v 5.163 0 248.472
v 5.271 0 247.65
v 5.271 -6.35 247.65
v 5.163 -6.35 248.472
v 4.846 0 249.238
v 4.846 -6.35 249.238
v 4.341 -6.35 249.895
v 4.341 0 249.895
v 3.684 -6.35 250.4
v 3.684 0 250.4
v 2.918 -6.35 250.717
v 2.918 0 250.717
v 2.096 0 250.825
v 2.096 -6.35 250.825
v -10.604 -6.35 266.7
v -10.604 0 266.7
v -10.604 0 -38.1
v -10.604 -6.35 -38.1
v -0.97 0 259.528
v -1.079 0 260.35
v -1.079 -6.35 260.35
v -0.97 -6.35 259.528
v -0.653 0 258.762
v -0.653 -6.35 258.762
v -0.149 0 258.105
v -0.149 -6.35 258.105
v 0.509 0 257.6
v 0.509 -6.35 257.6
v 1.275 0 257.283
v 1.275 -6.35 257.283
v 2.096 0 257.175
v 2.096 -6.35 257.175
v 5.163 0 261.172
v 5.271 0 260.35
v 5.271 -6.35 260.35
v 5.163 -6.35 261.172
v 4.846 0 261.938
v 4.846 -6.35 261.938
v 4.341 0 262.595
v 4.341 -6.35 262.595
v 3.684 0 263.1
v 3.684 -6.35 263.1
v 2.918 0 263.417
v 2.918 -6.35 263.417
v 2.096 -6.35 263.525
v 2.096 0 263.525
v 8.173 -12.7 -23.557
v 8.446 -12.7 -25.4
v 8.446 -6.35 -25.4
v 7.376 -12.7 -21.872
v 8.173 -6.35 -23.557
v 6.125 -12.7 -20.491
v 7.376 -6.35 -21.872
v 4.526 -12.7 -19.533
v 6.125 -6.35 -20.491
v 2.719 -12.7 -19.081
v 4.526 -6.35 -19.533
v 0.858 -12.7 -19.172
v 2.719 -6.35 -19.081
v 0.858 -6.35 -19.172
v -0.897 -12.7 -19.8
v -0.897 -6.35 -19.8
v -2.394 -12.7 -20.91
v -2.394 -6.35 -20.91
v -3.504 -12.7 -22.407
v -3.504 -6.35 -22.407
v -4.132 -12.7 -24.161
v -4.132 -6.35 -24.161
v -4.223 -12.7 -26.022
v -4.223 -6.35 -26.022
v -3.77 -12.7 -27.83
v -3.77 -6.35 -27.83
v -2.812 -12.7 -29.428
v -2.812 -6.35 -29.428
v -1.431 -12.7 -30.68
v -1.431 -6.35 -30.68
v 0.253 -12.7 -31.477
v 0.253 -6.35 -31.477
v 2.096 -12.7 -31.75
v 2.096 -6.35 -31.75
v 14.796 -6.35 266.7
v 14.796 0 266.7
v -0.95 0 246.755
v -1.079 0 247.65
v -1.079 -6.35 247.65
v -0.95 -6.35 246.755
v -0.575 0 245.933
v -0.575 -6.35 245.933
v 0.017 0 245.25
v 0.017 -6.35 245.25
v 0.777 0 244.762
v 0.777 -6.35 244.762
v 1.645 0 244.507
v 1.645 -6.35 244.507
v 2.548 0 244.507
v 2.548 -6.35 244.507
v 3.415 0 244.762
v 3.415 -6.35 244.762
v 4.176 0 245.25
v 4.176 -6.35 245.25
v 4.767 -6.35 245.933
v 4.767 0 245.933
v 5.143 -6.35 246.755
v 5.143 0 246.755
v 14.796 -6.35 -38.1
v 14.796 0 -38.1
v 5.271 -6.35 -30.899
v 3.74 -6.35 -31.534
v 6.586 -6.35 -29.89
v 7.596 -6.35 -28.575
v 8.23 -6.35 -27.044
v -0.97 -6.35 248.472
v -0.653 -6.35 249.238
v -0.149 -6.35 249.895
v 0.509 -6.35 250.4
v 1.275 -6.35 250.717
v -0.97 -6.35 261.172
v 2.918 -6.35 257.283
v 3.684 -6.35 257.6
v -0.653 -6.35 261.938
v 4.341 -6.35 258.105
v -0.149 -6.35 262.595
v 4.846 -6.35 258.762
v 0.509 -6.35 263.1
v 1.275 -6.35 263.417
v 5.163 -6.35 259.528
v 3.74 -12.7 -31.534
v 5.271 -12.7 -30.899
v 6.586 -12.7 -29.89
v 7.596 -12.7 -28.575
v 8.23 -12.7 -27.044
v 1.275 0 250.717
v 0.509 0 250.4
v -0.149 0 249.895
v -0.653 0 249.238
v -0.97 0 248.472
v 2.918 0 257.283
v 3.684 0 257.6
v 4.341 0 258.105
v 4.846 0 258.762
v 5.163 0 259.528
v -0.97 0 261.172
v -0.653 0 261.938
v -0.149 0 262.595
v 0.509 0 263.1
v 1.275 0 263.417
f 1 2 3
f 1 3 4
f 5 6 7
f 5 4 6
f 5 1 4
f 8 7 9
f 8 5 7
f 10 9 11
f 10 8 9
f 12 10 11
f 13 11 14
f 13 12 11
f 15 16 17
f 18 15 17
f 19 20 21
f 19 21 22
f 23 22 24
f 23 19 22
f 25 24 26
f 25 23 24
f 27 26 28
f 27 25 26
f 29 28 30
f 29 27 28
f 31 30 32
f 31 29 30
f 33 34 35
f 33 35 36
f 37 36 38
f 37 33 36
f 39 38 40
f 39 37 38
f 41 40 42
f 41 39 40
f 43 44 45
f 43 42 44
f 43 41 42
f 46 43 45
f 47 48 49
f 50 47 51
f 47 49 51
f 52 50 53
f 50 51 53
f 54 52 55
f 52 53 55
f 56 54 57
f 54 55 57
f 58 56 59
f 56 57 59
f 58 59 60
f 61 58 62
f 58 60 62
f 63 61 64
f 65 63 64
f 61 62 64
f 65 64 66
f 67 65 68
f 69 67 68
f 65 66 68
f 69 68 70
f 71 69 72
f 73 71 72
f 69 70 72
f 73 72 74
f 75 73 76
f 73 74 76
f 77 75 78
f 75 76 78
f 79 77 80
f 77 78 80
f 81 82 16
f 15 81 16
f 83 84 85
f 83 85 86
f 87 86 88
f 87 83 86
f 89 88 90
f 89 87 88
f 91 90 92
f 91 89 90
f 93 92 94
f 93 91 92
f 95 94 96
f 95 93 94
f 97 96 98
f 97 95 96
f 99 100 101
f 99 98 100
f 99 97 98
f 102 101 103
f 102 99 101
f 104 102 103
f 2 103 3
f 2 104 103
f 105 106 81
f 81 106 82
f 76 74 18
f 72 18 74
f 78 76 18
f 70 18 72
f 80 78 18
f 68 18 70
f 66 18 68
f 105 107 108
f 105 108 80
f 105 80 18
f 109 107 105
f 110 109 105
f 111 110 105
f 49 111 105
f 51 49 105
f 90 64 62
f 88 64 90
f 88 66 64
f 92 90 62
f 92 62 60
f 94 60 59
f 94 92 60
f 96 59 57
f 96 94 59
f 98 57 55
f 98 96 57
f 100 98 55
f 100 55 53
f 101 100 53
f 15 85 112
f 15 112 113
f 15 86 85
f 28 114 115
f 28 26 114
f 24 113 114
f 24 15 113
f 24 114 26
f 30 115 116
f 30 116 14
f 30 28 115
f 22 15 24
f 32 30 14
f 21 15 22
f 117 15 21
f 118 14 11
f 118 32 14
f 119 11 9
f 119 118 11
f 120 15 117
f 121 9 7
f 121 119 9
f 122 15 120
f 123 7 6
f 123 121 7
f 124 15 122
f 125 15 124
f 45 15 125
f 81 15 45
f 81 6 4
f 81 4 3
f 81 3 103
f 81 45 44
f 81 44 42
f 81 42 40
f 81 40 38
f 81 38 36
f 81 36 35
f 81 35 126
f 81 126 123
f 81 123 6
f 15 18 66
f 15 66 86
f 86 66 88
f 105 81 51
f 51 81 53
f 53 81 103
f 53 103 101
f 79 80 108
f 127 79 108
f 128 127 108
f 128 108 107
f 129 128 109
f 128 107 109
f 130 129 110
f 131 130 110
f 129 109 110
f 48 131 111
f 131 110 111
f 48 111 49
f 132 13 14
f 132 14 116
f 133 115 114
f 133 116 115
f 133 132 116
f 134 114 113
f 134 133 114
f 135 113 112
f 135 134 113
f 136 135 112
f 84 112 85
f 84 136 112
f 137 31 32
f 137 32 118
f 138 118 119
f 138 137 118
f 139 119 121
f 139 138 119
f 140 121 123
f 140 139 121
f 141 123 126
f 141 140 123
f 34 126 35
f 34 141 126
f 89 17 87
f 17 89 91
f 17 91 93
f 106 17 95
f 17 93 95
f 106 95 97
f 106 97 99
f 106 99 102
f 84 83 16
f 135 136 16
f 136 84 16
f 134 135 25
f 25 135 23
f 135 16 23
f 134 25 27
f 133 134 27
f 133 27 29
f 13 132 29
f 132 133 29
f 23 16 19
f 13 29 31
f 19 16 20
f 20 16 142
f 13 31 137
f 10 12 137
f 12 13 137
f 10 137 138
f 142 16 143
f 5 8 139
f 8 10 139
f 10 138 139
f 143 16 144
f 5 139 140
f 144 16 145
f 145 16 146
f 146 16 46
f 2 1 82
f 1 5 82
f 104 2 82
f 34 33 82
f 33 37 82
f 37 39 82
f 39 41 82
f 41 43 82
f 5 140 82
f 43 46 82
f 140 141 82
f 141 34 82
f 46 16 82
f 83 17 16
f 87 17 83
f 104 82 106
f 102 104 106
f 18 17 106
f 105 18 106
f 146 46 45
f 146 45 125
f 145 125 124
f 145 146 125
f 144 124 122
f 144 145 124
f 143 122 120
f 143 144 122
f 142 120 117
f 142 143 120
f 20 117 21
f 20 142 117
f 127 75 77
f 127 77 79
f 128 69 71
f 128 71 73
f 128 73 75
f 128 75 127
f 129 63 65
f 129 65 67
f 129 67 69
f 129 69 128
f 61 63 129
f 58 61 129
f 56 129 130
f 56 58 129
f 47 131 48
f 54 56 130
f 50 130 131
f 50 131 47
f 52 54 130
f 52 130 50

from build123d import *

# Parameters (mm, degrees)
F1_DEPTH = 6.35
F2_DEPTH = 12.7
F3_DEPTH = 24.638


with BuildPart() as f1:
    # F0 (on Front) → F1 (new body)
    with BuildSketch(Plane.XZ):
        with BuildLine():
            Line((-1.0786289811, 247.65), (-10.6036289811, 247.65))
            Line((-10.6036289811, 247.65), (-10.6036289811, -38.1))
            Line((-10.6036289811, -38.1), (2.0963710189, -38.1))
            Line((2.0963710189, -38.1), (14.7963710189, -38.1))
            Line((14.7963710189, -38.1), (14.7963710189, 247.65))
            Line((14.7963710189, 247.65), (5.2713710189, 247.65))
            ThreePointArc((5.2713710189, 247.65), (2.0963710189, 244.475), (-1.0786289811, 247.65))
        make_face()
        with BuildLine():
            ThreePointArc((8.4463710189, -25.4), (6.5864990794, -29.8901280605), (2.0963710189, -31.75))
            ThreePointArc((2.0963710189, -31.75), (-2.3937570416, -20.9098719395), (8.4463710189, -25.4))
        make_face(mode=Mode.SUBTRACT)
        with BuildLine():
            Line((-1.0786289811, 260.35), (-10.6036289811, 260.35))
            Line((-10.6036289811, 260.35), (-10.6036289811, 247.65))
            Line((-10.6036289811, 247.65), (-1.0786289811, 247.65))
            ThreePointArc((-1.0786289811, 247.65), (-0.1486930114, 249.8950640303), (2.0963710189, 250.825))
            Line((2.0963710189, 250.825), (2.0963710189, 257.175))
            ThreePointArc((2.0963710189, 257.175), (-0.1486930114, 258.1049359697), (-1.0786289811, 260.35))
        make_face()
        with BuildLine():
            Line((14.7963710189, 247.65), (14.7963710189, 260.35))
            Line((14.7963710189, 260.35), (5.2713710189, 260.35))
            ThreePointArc((5.2713710189, 260.35), (4.3414350492, 258.1049359697), (2.0963710189, 257.175))
            Line((2.0963710189, 257.175), (2.0963710189, 250.825))
            ThreePointArc((2.0963710189, 250.825), (4.3414350492, 249.8950640303), (5.2713710189, 247.65))
            Line((5.2713710189, 247.65), (14.7963710189, 247.65))
        make_face()
        with BuildLine():
            ThreePointArc((8.4463710189, -25.4), (-2.3937570416, -20.9098719395), (2.0963710189, -31.75))
            ThreePointArc((2.0963710189, -31.75), (6.5864990794, -29.8901280605), (8.4463710189, -25.4))
        make_face()
        with BuildLine():
            Line((2.0963710189, 266.7), (-10.6036289811, 266.7))
            Line((-10.6036289811, 266.7), (-10.6036289811, 260.35))
            Line((-10.6036289811, 260.35), (-1.0786289811, 260.35))
            ThreePointArc((-1.0786289811, 260.35), (-0.1486930114, 262.5950640303), (2.0963710189, 263.525))
            Line((2.0963710189, 263.525), (2.0963710189, 266.7))
        make_face()
        with BuildLine():
            Line((14.7963710189, 266.7), (2.0963710189, 266.7))
            Line((2.0963710189, 266.7), (2.0963710189, 263.525))
            ThreePointArc((2.0963710189, 263.525), (4.3414350492, 262.5950640303), (5.2713710189, 260.35))
            Line((5.2713710189, 260.35), (14.7963710189, 260.35))
            Line((14.7963710189, 260.35), (14.7963710189, 266.7))
        make_face()
        with BuildLine():
            Line((2.0963710189, 247.65), (-1.0786289811, 247.65))
            ThreePointArc((-1.0786289811, 247.65), (2.0963710189, 244.475), (5.2713710189, 247.65))
            Line((5.2713710189, 247.65), (2.0963710189, 247.65))
        make_face()
        with BuildLine():
            Line((5.2713710189, 260.35), (2.0963710189, 260.35))
            Line((2.0963710189, 260.35), (2.0963710189, 257.175))
            ThreePointArc((2.0963710189, 257.175), (4.3414350492, 258.1049359697), (5.2713710189, 260.35))
        make_face()
        with BuildLine():
            ThreePointArc((2.0963710189, 250.825), (-0.1486930114, 249.8950640303), (-1.0786289811, 247.65))
            Line((-1.0786289811, 247.65), (2.0963710189, 247.65))
            Line((2.0963710189, 247.65), (2.0963710189, 250.825))
        make_face()
        with BuildLine():
            Line((2.0963710189, 260.35), (2.0963710189, 263.525))
            ThreePointArc((2.0963710189, 263.525), (-0.1486930114, 262.5950640303), (-1.0786289811, 260.35))
            Line((-1.0786289811, 260.35), (2.0963710189, 260.35))
        make_face()
        with BuildLine():
            Line((2.0963710189, 260.35), (-1.0786289811, 260.35))
            ThreePointArc((-1.0786289811, 260.35), (-0.1486930114, 258.1049359697), (2.0963710189, 257.175))
            Line((2.0963710189, 257.175), (2.0963710189, 260.35))
        make_face()
        with BuildLine():
            ThreePointArc((5.2713710189, 260.35), (4.3414350492, 262.5950640303), (2.0963710189, 263.525))
            Line((2.0963710189, 263.525), (2.0963710189, 260.35))
            Line((2.0963710189, 260.35), (5.2713710189, 260.35))
        make_face()
        with BuildLine():
            Line((2.0963710189, 250.825), (2.0963710189, 247.65))
            Line((2.0963710189, 247.65), (5.2713710189, 247.65))
            ThreePointArc((5.2713710189, 247.65), (4.3414350492, 249.8950640303), (2.0963710189, 250.825))
        make_face()
    extrude(amount=F1_DEPTH)

    # F0 (on Front) → F2 (join)
    with BuildSketch(Plane.XZ):
        with BuildLine():
            ThreePointArc((8.4463710189, -25.4), (-2.3937570416, -20.9098719395), (2.0963710189, -31.75))
            ThreePointArc((2.0963710189, -31.75), (6.5864990794, -29.8901280605), (8.4463710189, -25.4))
        make_face()
    extrude(amount=F2_DEPTH)

    # F0 (on Front) → F3 (cut)
    with BuildSketch(Plane.XZ):
        with BuildLine():
            Line((2.0963710189, 250.825), (2.0963710189, 247.65))
            Line((2.0963710189, 247.65), (5.2713710189, 247.65))
            ThreePointArc((5.2713710189, 247.65), (4.3414350492, 249.8950640303), (2.0963710189, 250.825))
        make_face()
        with BuildLine():
            ThreePointArc((2.0963710189, 250.825), (-0.1486930114, 249.8950640303), (-1.0786289811, 247.65))
            Line((-1.0786289811, 247.65), (2.0963710189, 247.65))
            Line((2.0963710189, 247.65), (2.0963710189, 250.825))
        make_face()
        with BuildLine():
            Line((2.0963710189, 247.65), (-1.0786289811, 247.65))
            ThreePointArc((-1.0786289811, 247.65), (2.0963710189, 244.475), (5.2713710189, 247.65))
            Line((5.2713710189, 247.65), (2.0963710189, 247.65))
        make_face()
        with BuildLine():
            ThreePointArc((5.2713710189, 260.35), (4.3414350492, 262.5950640303), (2.0963710189, 263.525))
            Line((2.0963710189, 263.525), (2.0963710189, 260.35))
            Line((2.0963710189, 260.35), (5.2713710189, 260.35))
        make_face()
        with BuildLine():
            Line((2.0963710189, 260.35), (2.0963710189, 263.525))
            ThreePointArc((2.0963710189, 263.525), (-0.1486930114, 262.5950640303), (-1.0786289811, 260.35))
            Line((-1.0786289811, 260.35), (2.0963710189, 260.35))
        make_face()
        with BuildLine():
            Line((2.0963710189, 260.35), (-1.0786289811, 260.35))
            ThreePointArc((-1.0786289811, 260.35), (-0.1486930114, 258.1049359697), (2.0963710189, 257.175))
            Line((2.0963710189, 257.175), (2.0963710189, 260.35))
        make_face()
        with BuildLine():
            Line((5.2713710189, 260.35), (2.0963710189, 260.35))
            Line((2.0963710189, 260.35), (2.0963710189, 257.175))
            ThreePointArc((2.0963710189, 257.175), (4.3414350492, 258.1049359697), (5.2713710189, 260.35))
        make_face()
    extrude(amount=F3_DEPTH, mode=Mode.SUBTRACT)


solid = f1.part
